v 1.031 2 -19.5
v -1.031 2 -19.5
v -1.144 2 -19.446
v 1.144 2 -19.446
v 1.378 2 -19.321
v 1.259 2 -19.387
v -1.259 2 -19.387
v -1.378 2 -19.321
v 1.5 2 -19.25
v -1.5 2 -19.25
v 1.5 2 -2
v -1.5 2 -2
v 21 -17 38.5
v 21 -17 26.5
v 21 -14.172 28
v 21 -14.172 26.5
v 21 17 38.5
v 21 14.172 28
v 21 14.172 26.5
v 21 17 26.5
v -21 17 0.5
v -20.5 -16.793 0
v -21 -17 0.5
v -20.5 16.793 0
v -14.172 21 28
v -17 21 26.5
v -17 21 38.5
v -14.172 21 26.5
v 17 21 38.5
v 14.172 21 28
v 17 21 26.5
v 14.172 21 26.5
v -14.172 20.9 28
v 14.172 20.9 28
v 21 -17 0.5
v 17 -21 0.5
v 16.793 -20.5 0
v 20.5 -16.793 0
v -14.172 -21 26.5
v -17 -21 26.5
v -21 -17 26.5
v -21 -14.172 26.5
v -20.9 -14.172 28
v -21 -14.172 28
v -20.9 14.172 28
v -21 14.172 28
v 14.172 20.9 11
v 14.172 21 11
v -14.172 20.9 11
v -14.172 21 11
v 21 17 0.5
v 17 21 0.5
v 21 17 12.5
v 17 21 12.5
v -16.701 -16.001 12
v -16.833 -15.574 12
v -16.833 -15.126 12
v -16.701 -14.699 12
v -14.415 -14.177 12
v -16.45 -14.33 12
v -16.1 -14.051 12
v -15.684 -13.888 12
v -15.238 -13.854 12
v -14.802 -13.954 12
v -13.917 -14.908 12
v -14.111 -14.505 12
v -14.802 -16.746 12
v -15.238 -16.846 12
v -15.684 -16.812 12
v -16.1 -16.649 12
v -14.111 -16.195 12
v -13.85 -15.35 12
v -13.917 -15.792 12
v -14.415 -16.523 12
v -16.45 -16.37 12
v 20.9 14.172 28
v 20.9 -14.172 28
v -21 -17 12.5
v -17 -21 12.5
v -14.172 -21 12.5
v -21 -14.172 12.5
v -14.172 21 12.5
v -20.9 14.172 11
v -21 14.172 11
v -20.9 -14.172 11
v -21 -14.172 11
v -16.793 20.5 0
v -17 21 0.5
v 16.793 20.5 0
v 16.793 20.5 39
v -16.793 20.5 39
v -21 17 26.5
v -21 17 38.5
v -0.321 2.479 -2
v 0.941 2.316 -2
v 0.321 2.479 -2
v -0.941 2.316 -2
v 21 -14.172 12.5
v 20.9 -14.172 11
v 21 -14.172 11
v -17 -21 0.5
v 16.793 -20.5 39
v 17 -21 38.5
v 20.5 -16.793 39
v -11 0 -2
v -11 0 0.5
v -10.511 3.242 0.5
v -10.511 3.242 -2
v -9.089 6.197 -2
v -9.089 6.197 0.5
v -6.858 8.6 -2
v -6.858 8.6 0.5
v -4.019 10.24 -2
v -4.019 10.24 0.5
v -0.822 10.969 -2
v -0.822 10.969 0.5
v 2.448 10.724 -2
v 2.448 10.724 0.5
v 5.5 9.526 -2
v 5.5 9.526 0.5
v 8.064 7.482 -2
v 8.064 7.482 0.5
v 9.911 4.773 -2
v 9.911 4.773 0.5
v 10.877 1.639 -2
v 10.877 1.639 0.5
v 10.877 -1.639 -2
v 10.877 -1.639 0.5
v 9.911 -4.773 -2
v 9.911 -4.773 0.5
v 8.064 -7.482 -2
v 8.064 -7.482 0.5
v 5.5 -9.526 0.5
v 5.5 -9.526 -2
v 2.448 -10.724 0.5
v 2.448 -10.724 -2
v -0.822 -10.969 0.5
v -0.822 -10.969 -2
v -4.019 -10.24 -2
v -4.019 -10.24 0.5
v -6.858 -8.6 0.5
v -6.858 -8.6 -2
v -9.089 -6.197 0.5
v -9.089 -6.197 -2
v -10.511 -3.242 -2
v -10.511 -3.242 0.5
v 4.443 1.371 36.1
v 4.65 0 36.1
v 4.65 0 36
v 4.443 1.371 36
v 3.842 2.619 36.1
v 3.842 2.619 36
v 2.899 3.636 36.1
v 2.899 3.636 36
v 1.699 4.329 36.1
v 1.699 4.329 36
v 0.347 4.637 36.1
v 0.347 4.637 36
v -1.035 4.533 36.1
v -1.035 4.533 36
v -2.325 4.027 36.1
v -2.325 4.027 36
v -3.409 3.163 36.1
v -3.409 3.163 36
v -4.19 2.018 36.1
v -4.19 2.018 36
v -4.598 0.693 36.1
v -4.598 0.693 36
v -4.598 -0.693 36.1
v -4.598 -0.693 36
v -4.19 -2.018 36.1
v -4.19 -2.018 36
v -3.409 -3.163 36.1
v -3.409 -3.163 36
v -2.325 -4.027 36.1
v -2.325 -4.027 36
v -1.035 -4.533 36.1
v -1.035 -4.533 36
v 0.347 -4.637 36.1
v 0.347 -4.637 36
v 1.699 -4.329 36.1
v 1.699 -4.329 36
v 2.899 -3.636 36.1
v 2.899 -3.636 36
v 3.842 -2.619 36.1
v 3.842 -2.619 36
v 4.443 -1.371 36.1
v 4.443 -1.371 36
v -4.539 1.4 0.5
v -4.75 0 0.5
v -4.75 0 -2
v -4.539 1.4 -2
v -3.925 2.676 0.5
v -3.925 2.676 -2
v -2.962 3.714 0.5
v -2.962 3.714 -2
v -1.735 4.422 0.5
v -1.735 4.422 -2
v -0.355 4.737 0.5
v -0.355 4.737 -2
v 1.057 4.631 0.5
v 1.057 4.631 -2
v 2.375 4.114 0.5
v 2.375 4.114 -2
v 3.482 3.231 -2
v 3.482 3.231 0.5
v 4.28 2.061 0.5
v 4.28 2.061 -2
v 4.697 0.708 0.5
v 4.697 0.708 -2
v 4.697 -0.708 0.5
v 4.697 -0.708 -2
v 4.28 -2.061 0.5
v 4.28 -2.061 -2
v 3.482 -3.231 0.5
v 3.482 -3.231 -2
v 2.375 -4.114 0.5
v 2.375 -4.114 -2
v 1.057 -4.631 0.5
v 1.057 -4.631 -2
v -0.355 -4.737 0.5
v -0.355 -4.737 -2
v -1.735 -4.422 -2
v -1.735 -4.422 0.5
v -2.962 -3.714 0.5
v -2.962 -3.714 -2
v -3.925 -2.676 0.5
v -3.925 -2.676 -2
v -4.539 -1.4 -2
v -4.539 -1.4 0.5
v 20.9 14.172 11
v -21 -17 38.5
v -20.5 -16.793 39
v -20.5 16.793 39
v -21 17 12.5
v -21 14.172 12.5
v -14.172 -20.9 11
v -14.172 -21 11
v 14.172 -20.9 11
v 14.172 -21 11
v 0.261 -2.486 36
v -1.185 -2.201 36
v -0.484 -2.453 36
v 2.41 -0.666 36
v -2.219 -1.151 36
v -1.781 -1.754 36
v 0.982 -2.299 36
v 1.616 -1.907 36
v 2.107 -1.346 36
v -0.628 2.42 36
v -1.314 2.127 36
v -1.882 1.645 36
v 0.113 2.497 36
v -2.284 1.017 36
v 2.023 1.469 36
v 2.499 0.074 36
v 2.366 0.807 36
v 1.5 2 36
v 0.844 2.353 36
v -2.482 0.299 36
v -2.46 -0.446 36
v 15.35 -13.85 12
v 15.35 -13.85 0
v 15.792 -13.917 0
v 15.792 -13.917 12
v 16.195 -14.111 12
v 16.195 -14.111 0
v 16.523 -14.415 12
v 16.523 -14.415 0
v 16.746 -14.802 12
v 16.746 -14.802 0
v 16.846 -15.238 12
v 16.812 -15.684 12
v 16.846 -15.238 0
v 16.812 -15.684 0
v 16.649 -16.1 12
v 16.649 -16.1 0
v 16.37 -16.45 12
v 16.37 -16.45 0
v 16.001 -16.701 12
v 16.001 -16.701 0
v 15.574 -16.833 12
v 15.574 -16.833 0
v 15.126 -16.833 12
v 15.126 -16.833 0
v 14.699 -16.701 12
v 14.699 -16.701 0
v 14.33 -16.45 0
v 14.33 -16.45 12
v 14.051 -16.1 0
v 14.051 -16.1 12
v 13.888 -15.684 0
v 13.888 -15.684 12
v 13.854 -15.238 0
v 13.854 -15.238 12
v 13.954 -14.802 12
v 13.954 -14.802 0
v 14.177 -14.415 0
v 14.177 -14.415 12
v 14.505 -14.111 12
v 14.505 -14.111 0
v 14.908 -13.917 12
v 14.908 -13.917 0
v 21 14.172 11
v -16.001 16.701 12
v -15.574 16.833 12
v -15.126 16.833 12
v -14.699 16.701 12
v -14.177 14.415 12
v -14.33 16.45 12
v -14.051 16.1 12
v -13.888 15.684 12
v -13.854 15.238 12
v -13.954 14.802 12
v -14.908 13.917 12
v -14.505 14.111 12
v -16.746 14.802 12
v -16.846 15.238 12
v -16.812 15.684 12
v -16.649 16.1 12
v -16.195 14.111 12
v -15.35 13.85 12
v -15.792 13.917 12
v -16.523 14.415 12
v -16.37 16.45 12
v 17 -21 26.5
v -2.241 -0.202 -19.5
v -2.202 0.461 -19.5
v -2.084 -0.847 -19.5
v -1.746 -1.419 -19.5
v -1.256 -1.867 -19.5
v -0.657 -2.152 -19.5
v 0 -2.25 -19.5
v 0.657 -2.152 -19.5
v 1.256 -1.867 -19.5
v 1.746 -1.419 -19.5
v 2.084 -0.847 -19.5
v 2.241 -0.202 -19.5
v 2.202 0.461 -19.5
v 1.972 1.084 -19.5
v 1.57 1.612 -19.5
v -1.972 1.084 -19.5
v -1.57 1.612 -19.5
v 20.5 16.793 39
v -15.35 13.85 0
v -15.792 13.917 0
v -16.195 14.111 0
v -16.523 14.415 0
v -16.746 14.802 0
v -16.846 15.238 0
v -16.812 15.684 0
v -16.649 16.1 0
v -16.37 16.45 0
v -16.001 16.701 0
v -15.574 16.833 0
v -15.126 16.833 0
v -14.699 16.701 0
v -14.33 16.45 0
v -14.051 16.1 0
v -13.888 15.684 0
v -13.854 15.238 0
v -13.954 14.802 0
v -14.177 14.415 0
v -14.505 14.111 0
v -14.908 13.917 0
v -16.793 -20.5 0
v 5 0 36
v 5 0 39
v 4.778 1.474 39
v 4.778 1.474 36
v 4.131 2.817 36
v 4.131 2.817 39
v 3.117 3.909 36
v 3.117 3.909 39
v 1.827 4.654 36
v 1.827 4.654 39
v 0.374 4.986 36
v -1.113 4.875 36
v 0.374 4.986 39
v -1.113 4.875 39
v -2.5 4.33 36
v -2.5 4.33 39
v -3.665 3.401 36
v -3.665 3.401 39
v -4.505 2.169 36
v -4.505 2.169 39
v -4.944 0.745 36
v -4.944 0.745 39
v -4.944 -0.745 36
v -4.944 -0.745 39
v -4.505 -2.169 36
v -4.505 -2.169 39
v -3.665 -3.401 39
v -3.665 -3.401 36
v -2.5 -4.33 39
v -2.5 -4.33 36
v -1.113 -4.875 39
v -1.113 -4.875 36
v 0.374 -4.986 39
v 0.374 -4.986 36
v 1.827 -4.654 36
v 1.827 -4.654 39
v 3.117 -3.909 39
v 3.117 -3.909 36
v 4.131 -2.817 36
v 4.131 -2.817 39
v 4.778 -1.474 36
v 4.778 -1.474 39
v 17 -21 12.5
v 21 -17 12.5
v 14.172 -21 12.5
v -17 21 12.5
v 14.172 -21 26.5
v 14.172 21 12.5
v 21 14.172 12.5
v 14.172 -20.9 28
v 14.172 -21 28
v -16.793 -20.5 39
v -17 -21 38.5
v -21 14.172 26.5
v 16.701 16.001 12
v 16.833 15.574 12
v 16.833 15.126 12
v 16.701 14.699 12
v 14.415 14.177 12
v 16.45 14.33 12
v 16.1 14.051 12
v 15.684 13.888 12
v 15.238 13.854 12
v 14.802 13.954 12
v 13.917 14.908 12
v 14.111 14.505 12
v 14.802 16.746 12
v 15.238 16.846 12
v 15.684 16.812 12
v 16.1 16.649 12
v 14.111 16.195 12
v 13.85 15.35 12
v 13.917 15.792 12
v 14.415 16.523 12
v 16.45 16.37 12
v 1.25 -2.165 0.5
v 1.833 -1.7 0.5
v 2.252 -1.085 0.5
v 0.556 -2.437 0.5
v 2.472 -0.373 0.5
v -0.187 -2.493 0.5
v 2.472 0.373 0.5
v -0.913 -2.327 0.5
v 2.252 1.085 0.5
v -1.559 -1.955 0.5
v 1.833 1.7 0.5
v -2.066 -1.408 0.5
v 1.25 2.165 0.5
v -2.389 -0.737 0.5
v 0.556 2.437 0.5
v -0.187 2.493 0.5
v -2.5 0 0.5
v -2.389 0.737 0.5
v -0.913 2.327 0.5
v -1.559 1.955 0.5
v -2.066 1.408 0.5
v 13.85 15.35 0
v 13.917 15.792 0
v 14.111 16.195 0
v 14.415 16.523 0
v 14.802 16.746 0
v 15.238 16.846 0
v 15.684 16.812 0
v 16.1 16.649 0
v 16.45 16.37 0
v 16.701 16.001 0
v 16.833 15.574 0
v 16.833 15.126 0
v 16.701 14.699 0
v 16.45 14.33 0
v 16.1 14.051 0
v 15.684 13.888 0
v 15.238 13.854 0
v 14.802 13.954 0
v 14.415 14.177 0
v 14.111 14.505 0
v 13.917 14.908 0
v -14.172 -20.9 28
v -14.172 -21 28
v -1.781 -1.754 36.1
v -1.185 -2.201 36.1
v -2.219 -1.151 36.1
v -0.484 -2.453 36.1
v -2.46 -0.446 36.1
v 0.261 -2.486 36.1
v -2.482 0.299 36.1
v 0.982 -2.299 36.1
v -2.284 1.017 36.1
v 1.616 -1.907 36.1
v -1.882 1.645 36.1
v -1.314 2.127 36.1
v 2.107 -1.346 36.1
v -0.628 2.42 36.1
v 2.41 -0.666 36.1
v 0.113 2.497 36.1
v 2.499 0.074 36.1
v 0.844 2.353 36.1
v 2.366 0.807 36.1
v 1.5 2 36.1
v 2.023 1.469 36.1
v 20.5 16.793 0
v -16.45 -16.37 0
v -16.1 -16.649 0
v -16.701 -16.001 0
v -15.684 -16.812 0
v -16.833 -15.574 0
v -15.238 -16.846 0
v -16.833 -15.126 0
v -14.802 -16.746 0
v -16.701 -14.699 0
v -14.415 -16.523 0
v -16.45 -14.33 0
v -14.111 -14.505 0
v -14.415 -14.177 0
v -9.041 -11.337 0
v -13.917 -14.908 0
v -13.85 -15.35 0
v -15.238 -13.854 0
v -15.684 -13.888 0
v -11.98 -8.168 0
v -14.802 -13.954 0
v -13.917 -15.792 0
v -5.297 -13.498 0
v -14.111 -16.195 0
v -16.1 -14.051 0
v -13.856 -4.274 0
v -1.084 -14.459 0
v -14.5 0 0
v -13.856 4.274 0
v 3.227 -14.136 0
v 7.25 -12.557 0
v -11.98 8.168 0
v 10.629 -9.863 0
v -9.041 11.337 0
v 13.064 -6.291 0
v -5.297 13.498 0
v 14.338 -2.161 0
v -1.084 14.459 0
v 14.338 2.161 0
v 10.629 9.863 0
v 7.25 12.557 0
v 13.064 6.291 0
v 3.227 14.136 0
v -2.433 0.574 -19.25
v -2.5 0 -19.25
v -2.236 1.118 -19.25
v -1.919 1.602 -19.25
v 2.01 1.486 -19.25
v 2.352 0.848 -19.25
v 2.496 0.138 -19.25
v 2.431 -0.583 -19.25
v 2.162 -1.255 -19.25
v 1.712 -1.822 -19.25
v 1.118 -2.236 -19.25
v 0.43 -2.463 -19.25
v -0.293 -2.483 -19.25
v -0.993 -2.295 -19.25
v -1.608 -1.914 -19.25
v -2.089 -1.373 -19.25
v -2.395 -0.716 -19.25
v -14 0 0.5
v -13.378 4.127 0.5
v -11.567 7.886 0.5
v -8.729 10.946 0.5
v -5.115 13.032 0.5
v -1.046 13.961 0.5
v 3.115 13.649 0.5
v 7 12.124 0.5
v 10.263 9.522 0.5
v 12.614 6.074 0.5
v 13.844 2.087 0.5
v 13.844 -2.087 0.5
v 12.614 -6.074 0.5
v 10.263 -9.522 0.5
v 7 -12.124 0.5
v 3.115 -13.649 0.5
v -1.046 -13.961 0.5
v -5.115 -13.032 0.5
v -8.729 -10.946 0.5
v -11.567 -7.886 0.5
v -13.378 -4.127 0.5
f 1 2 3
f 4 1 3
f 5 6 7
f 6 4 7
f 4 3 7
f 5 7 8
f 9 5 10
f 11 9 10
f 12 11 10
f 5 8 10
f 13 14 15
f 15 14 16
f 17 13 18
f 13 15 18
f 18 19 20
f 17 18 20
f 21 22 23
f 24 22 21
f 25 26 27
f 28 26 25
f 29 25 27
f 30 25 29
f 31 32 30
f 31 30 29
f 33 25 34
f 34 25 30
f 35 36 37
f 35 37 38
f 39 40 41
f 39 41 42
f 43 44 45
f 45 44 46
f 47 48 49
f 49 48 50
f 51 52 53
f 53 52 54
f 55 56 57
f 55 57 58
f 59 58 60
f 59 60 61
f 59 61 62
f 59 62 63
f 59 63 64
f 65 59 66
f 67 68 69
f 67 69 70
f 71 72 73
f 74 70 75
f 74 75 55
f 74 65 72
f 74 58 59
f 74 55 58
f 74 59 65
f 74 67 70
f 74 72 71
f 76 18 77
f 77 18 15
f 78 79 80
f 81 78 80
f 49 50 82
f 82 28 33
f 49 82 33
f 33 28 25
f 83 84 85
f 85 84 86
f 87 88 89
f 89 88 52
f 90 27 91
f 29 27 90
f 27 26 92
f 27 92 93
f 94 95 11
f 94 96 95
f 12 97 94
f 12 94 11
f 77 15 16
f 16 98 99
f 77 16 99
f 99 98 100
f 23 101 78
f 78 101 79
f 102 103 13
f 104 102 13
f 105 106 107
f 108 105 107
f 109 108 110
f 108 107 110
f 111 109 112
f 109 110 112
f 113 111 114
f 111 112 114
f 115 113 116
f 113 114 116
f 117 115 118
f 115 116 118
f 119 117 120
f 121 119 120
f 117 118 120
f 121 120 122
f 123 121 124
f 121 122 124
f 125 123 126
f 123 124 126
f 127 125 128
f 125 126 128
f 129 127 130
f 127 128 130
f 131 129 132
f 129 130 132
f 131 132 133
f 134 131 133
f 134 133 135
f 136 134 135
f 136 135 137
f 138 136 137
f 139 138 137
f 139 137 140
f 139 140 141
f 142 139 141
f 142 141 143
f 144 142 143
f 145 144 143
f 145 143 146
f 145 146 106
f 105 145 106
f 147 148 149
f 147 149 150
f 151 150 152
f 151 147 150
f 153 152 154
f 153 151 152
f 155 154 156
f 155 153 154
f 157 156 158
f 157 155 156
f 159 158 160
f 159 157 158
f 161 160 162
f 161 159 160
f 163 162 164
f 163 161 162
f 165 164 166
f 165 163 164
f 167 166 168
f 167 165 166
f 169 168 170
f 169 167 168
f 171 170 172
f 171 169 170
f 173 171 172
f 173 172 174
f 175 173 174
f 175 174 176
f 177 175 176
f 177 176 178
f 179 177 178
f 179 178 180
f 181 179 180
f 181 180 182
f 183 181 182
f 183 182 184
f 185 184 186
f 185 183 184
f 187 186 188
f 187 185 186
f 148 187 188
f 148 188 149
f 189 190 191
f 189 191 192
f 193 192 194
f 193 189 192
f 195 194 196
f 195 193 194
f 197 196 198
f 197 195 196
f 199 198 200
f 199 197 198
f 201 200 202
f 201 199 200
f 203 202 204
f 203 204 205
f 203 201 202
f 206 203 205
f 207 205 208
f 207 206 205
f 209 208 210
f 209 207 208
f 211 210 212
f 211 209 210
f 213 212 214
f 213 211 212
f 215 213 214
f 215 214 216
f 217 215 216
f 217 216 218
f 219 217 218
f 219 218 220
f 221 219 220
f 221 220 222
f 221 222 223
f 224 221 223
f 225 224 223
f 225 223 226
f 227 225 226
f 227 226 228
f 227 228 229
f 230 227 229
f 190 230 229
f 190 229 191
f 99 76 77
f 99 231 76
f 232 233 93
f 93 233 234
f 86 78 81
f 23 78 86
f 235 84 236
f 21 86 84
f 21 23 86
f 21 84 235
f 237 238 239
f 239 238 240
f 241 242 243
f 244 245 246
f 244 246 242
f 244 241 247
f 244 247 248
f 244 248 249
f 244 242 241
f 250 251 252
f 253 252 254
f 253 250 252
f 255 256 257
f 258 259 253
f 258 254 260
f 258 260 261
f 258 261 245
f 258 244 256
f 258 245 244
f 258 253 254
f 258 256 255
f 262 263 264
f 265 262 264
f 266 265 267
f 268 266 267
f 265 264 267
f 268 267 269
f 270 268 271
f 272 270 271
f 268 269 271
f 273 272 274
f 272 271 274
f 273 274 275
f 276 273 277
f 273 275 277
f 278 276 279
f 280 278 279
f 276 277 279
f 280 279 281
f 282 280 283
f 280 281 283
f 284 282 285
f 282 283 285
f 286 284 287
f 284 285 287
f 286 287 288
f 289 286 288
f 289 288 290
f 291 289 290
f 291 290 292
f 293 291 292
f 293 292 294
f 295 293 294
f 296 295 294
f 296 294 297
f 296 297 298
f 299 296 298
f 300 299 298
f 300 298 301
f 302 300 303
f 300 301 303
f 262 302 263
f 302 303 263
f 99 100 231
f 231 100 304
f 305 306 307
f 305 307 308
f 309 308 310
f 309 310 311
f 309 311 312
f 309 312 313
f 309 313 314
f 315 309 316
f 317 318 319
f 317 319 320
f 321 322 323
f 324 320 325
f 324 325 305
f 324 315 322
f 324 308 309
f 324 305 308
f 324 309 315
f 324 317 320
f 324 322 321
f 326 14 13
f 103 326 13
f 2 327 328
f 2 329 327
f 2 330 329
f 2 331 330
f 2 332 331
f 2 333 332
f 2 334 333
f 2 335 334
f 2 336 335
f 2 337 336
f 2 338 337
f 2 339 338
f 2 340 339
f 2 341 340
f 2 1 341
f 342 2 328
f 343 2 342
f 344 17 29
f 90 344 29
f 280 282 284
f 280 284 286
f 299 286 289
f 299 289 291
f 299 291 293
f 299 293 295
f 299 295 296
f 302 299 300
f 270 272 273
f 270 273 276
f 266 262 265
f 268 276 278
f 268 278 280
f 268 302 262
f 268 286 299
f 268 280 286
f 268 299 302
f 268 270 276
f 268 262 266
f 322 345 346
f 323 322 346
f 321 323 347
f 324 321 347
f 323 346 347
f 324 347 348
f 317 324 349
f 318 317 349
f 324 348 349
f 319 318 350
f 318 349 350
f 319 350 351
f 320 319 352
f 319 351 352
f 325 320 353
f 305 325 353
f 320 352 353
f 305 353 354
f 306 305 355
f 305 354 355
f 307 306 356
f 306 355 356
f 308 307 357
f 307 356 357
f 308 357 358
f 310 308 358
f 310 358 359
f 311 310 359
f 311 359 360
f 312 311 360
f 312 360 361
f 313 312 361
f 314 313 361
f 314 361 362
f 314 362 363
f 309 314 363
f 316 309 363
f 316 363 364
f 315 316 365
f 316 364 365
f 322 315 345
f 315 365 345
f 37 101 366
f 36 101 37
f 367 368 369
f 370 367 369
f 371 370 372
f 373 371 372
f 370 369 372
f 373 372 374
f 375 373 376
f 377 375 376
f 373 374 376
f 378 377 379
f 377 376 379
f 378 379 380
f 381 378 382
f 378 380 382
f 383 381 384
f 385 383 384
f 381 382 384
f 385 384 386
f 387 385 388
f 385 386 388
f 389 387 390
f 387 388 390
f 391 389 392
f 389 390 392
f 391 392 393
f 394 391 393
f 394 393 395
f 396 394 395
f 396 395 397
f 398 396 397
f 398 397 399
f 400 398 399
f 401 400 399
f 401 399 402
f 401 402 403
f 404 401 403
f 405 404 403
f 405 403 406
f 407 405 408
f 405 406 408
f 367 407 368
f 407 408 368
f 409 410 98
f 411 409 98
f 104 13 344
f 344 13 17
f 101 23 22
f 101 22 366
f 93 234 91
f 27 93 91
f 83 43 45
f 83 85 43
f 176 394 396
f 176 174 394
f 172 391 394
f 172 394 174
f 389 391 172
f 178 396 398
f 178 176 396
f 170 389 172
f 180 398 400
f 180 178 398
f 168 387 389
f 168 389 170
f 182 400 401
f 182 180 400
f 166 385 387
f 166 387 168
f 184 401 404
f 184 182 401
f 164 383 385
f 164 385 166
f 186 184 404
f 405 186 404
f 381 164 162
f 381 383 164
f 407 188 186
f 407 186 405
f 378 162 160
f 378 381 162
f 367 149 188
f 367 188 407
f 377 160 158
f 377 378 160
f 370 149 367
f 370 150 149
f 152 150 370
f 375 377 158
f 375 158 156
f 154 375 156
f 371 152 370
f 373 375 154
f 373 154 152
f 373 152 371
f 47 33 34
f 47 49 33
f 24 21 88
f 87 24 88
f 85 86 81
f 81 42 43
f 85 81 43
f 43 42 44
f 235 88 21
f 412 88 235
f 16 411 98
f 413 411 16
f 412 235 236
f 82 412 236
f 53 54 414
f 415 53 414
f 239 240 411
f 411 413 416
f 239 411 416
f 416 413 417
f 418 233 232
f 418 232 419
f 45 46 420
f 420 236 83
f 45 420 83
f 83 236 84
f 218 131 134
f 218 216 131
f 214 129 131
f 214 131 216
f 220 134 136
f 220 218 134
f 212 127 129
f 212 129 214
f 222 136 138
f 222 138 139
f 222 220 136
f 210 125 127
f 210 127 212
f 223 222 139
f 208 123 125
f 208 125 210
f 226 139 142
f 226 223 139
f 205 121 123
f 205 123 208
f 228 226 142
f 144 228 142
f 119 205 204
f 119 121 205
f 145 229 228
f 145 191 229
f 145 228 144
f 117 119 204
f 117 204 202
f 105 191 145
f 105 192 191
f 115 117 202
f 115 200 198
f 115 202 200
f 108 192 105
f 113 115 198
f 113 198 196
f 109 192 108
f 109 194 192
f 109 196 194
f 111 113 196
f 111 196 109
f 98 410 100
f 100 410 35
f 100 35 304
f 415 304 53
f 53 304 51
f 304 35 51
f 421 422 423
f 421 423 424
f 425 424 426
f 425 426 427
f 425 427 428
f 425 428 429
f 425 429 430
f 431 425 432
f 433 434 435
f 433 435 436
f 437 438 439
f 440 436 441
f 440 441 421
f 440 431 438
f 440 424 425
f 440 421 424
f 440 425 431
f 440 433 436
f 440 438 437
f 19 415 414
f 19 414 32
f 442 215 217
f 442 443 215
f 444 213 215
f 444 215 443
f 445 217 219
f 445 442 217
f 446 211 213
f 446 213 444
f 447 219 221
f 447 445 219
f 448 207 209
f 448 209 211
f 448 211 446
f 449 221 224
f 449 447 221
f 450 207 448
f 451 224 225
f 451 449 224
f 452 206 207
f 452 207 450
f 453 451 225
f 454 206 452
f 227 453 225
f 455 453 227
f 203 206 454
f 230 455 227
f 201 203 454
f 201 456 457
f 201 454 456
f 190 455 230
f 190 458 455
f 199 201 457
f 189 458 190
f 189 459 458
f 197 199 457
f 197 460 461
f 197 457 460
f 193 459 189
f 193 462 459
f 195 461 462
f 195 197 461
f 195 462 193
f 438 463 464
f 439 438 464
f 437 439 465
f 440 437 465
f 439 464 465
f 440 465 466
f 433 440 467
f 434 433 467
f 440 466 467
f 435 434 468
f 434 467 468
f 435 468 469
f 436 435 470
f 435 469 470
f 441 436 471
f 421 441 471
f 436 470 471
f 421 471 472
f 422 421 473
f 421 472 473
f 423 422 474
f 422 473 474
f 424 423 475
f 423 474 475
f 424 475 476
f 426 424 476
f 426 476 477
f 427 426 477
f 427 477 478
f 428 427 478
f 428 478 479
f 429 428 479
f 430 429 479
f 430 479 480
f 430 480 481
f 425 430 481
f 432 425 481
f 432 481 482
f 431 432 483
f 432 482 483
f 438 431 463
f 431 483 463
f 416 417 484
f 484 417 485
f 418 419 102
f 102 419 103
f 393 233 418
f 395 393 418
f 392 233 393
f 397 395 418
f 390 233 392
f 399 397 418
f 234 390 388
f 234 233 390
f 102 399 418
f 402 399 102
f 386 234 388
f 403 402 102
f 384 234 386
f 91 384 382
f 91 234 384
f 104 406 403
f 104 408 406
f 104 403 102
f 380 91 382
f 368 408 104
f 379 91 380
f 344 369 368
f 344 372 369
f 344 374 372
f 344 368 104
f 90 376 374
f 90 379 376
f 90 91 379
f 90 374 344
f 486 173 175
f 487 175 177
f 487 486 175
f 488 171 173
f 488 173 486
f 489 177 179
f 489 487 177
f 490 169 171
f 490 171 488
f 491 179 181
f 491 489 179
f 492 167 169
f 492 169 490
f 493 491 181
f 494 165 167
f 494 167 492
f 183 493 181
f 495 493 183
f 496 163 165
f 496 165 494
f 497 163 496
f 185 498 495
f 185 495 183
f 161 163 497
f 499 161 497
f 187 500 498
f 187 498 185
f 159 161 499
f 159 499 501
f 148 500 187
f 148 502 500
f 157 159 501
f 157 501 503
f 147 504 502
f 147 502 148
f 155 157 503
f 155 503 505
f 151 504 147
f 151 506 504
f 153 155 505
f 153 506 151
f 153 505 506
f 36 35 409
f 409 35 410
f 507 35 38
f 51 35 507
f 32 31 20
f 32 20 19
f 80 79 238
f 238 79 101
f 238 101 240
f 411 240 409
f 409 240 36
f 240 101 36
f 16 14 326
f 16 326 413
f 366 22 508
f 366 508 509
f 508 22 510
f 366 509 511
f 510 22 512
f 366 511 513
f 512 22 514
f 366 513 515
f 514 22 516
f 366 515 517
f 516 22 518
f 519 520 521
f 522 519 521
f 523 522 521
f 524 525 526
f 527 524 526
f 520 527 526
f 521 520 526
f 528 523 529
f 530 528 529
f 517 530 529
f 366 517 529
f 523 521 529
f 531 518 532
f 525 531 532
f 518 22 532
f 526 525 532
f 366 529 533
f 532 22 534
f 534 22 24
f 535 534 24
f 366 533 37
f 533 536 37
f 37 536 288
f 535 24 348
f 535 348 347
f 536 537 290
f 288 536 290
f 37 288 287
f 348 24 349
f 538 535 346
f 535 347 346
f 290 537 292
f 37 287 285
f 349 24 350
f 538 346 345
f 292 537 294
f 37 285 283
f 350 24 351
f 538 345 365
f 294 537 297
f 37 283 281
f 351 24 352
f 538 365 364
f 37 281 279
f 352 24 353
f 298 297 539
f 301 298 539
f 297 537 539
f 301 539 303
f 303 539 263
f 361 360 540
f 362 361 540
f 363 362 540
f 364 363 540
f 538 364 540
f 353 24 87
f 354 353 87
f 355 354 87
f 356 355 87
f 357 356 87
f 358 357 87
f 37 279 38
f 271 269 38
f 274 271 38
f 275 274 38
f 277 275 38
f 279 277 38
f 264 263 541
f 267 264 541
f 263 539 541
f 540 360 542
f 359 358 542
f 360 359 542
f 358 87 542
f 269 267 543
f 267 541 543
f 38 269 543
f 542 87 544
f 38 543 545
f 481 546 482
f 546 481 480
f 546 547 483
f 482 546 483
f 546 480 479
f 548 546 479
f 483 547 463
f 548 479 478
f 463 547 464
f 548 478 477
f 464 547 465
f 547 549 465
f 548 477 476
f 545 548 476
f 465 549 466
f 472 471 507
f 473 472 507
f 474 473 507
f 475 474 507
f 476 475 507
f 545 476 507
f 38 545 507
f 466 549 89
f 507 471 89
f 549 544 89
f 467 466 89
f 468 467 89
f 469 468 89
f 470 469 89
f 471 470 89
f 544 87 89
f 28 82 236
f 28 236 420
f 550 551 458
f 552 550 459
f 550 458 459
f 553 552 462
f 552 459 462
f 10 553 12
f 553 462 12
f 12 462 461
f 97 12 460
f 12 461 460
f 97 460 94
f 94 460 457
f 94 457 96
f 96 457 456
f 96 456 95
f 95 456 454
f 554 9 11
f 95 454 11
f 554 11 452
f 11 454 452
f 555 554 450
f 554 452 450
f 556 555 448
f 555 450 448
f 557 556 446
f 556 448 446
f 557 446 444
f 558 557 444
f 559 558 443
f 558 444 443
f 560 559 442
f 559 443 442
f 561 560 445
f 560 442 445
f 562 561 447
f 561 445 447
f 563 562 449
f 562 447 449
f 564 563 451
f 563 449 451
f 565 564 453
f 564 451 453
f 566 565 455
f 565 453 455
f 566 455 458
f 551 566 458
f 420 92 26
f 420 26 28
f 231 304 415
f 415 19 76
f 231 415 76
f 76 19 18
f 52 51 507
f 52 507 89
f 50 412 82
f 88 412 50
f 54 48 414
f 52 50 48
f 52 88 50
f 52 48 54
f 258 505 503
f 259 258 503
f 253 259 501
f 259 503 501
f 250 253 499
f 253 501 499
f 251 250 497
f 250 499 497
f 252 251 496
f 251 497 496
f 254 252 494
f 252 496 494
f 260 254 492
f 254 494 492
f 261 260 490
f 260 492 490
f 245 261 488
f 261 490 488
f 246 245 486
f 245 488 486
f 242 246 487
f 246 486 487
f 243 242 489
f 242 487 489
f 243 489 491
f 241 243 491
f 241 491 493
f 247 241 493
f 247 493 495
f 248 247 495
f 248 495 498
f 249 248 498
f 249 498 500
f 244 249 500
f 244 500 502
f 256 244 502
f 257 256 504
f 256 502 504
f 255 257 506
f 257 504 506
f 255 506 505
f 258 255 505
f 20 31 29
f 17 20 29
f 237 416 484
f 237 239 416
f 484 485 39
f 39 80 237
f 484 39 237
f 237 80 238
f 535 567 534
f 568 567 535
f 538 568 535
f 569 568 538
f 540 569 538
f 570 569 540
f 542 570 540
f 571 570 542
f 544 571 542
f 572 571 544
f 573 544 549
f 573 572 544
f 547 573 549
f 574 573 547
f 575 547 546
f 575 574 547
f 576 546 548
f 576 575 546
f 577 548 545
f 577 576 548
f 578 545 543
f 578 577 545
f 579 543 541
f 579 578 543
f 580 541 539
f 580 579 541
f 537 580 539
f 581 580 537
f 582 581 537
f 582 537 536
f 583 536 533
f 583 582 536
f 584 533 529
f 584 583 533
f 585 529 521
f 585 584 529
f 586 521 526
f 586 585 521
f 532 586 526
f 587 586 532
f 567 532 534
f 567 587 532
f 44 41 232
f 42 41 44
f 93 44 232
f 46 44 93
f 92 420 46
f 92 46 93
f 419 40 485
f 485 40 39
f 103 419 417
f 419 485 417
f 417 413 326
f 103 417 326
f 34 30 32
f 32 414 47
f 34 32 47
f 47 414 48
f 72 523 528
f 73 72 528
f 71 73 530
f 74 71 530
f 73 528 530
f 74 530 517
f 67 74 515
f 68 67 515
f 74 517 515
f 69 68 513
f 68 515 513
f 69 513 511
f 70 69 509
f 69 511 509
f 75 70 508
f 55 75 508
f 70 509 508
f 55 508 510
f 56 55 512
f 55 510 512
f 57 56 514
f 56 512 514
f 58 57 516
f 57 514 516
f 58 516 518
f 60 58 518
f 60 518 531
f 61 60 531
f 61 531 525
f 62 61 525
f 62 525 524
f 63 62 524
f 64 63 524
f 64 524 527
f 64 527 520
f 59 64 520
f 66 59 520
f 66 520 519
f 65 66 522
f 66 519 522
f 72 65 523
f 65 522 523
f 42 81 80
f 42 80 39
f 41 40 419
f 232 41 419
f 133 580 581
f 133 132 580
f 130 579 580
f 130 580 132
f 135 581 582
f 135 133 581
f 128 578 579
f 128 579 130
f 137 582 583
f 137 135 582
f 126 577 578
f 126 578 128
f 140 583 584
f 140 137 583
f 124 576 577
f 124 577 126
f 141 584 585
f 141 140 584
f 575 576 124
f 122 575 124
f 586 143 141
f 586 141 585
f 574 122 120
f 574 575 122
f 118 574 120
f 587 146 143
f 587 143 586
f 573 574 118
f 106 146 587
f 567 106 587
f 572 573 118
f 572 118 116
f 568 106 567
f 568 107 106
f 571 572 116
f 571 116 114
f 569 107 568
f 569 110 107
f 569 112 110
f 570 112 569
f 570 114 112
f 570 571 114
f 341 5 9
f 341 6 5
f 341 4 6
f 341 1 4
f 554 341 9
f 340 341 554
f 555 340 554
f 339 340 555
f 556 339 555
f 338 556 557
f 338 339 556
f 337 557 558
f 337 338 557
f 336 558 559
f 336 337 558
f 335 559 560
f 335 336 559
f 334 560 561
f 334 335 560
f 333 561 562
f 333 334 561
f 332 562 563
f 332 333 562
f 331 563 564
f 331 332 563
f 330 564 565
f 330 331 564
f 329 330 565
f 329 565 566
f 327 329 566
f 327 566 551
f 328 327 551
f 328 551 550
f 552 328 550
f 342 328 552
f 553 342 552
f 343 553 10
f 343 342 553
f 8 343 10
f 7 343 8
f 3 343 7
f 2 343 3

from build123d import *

# Parameters (mm, degrees)
CROQUIS1_W              = 42
CROQUIS1_H              = 42
SALIENTE_EXTRUIR1_DEPTH = 39
CHAFL_N2_SIZE           = 4
CHAFL_N3_SIZE           = 0.5
CROQUIS2_R              = 15
CORTAR_EXTRUIR2_DEPTH   = 0.5
CHAFL_N4_SIZE           = 1
CROQUIS3_R              = 11
CROQUIS3_R_2            = 4.75
SALIENTE_EXTRUIR2_DEPTH = 2.5
CROQUIS4_R              = 2.5
SALIENTE_EXTRUIR3_DEPTH = 20
CHAFL_N5_SIZE           = 0.25
CROQUIS5_W              = 26.553784045
CROQUIS5_H              = 10.322094095
CORTAR_EXTRUIR3_DEPTH   = 17.5
CROQUIS6_R              = 1.5
CORTAR_EXTRUIR4_DEPTH   = 12
MATRIZC1_COUNT          = 4
CROQUIS7_W              = 14
CROQUIS7_H              = 16.933623344
CORTAR_EXTRUIR5_DEPTH   = 2
MATRIZC2_COUNT          = 4
CORTAR_EXTRUIR6_DEPTH   = 0.1
MATRIZC3_COUNT          = 4
CROQUIS9_R              = 5
CORTAR_EXTRUIR7_DEPTH   = 3
SALIENTE_EXTRUIR4_START = 0.1
CROQUIS10_R             = 4.65
CROQUIS10_R_2           = 2.5
SALIENTE_EXTRUIR4_DEPTH = 0.1


with BuildPart() as part:
    # Croquis1 → Saliente-Extruir1 (new body)
    with BuildSketch(Plane.XY):
        Rectangle(CROQUIS1_W, CROQUIS1_H)
    extrude(amount=SALIENTE_EXTRUIR1_DEPTH)

    # Chaflán2
    chafl_n2_edges = [part.edges().sort_by_distance(p)[0] for p in [
        (21, -21, 19.5),
        (-21, -21, 19.5),
        (-21, 21, 19.5),
        (21, 21, 19.5),
    ]]
    chamfer(chafl_n2_edges, length=CHAFL_N2_SIZE)

    # Chaflán3
    chafl_n3_edges = [part.edges().sort_by_distance(p)[0] for p in [
        (21, 0, 0),
        (21, 0, 39),
        (0, -21, 0),
        (-21, 0, 0),
        (0, 21, 0),
        (-19, -19, 0),
        (-19, 19, 0),
        (19, 19, 0),
        (19, -19, 0),
        (0, -21, 39),
        (0, 21, 39),
        (-21, 0, 39),
        (-19, -19, 39),
        (-19, 19, 39),
        (19, 19, 39),
        (19, -19, 39),
    ]]
    chamfer(chafl_n3_edges, length=CHAFL_N3_SIZE)

    # Croquis2 → Cortar-Extruir2 (cut)
    with BuildSketch(Plane(origin=(0, 0, 0), x_dir=(-1, 0, 0), z_dir=(0, 0, -1))):
        Circle(CROQUIS2_R)
    extrude(amount=-CORTAR_EXTRUIR2_DEPTH, mode=Mode.SUBTRACT)

    # Chaflán4
    # the kernel refuses this chamfer: 1 mm, written as the material it adds along each edge
    with BuildSketch(Plane(origin=(0, 0, 0.5), x_dir=(-1, 0, 0), z_dir=(0, -1, 0))) as chafl_n4_piece_1_section:
        Polygon((15, CHAFL_N4_SIZE), (15 - CHAFL_N4_SIZE, 0), (15, 0), align=None)
    chafl_n4_piece_1 = revolve(axis=Axis((0, 0, 0.5), (0, 0, -1)), mode=Mode.PRIVATE)
    chafl_n4_piece_1 = split(chafl_n4_piece_1, bisect_by=Plane(origin=(14.259533629, 0, 0), z_dir=(0, 0, 1)), keep=Keep.TOP, mode=Mode.PRIVATE)
    add(chafl_n4_piece_1)

    # Croquis3 → Saliente-Extruir2 (add)
    with BuildSketch(Plane(origin=(0, 0, 0.5), x_dir=(-1, 0, 0), z_dir=(0, 0, -1))):
        Circle(CROQUIS3_R)
        Circle(CROQUIS3_R_2, mode=Mode.SUBTRACT)
    extrude(amount=SALIENTE_EXTRUIR2_DEPTH)

    # Croquis4 → Saliente-Extruir3 (add)
    with BuildSketch(Plane(origin=(0, 0, 0.5), x_dir=(-1, 0, 0), z_dir=(0, 0, -1))):
        Circle(CROQUIS4_R)
    extrude(amount=SALIENTE_EXTRUIR3_DEPTH)

    # Chaflán5
    chafl_n5_edges = [part.edges().sort_by_distance(p)[0] for p in [
        (2.5, 0, -19.5),
    ]]
    chamfer(chafl_n5_edges, length=CHAFL_N5_SIZE)

    # Croquis5 → Cortar-Extruir3 (cut)
    with BuildSketch(Plane(origin=(0, 0, -19.5), x_dir=(-1, 0, 0), z_dir=(0, 0, -1))):
        with Locations((-4.826169949, 7.161047048)):
            Rectangle(CROQUIS5_W, CROQUIS5_H)
    extrude(amount=-CORTAR_EXTRUIR3_DEPTH, mode=Mode.SUBTRACT)

    # Croquis6 → Cortar-Extruir4 (cut)
    with BuildSketch(Plane(origin=(0, 0, 0), x_dir=(-1, 0, 0), z_dir=(0, 0, -1))):
        with Locations((-15.35, 15.35)):
            Circle(CROQUIS6_R)
    cortar_extruir4 = extrude(amount=-CORTAR_EXTRUIR4_DEPTH, mode=Mode.SUBTRACT)

    # MatrizC1: Cortar-Extruir4 ×4 about axis
    matrizc1_axis = Axis((0, 0, 0), (0, 0, 1))
    for i in range(1, MATRIZC1_COUNT):
        add(cortar_extruir4.rotate(matrizc1_axis, i * 360 / MATRIZC1_COUNT), mode=Mode.SUBTRACT)

    # Croquis7 → Cortar-Extruir5 (cut)
    with BuildSketch(Plane(origin=(-19, -19, 0), x_dir=(0, 0, 1), z_dir=(-0.7071067811865487, -0.7071067811865465, 0))):
        with Locations((19.5, 0)):
            Rectangle(CROQUIS7_W, CROQUIS7_H)
    cortar_extruir5 = extrude(amount=-CORTAR_EXTRUIR5_DEPTH, mode=Mode.SUBTRACT)

    # MatrizC2: Cortar-Extruir5 ×4 about axis
    matrizc2_axis = Axis((0, 0, 0), (0, 0, 1))
    for i in range(1, MATRIZC2_COUNT):
        add(cortar_extruir5.rotate(matrizc2_axis, i * 360 / MATRIZC2_COUNT), mode=Mode.SUBTRACT)

    # Croquis8 → Cortar-Extruir6 (cut)
    with BuildSketch(Plane(origin=(0, 21, 0), x_dir=(1, 0, 0), z_dir=(0, 1, 0))):
        Polygon((-14.171572875, -12.5), (-14.171572875, -26.5), (-14.171572875, -28), (14.171572875, -28), (14.171572875, -26.5), (14.171572875, -12.5), (14.171572875, -11), (-14.171572875, -11), align=None)
    cortar_extruir6 = extrude(amount=-CORTAR_EXTRUIR6_DEPTH, mode=Mode.SUBTRACT)

    # MatrizC3: Cortar-Extruir6 ×4 about axis
    matrizc3_axis = Axis((0, 0, 0), (0, 0, 1))
    for i in range(1, MATRIZC3_COUNT):
        add(cortar_extruir6.rotate(matrizc3_axis, i * 360 / MATRIZC3_COUNT), mode=Mode.SUBTRACT)

    # Croquis9 → Cortar-Extruir7 (cut)
    with BuildSketch(Plane.XY.offset(39)):
        Circle(CROQUIS9_R)
    extrude(amount=-CORTAR_EXTRUIR7_DEPTH, mode=Mode.SUBTRACT)

    # Croquis10 → Saliente-Extruir4 (add)
    with BuildSketch(Plane.XY.offset(36).offset(SALIENTE_EXTRUIR4_START)):
        Circle(CROQUIS10_R)
        with Locations(Location((0, 0, 0), (0, 0, 53.130102354))):
            Circle(CROQUIS10_R_2, mode=Mode.SUBTRACT)
    extrude(amount=-SALIENTE_EXTRUIR4_DEPTH)


solid = part.part
